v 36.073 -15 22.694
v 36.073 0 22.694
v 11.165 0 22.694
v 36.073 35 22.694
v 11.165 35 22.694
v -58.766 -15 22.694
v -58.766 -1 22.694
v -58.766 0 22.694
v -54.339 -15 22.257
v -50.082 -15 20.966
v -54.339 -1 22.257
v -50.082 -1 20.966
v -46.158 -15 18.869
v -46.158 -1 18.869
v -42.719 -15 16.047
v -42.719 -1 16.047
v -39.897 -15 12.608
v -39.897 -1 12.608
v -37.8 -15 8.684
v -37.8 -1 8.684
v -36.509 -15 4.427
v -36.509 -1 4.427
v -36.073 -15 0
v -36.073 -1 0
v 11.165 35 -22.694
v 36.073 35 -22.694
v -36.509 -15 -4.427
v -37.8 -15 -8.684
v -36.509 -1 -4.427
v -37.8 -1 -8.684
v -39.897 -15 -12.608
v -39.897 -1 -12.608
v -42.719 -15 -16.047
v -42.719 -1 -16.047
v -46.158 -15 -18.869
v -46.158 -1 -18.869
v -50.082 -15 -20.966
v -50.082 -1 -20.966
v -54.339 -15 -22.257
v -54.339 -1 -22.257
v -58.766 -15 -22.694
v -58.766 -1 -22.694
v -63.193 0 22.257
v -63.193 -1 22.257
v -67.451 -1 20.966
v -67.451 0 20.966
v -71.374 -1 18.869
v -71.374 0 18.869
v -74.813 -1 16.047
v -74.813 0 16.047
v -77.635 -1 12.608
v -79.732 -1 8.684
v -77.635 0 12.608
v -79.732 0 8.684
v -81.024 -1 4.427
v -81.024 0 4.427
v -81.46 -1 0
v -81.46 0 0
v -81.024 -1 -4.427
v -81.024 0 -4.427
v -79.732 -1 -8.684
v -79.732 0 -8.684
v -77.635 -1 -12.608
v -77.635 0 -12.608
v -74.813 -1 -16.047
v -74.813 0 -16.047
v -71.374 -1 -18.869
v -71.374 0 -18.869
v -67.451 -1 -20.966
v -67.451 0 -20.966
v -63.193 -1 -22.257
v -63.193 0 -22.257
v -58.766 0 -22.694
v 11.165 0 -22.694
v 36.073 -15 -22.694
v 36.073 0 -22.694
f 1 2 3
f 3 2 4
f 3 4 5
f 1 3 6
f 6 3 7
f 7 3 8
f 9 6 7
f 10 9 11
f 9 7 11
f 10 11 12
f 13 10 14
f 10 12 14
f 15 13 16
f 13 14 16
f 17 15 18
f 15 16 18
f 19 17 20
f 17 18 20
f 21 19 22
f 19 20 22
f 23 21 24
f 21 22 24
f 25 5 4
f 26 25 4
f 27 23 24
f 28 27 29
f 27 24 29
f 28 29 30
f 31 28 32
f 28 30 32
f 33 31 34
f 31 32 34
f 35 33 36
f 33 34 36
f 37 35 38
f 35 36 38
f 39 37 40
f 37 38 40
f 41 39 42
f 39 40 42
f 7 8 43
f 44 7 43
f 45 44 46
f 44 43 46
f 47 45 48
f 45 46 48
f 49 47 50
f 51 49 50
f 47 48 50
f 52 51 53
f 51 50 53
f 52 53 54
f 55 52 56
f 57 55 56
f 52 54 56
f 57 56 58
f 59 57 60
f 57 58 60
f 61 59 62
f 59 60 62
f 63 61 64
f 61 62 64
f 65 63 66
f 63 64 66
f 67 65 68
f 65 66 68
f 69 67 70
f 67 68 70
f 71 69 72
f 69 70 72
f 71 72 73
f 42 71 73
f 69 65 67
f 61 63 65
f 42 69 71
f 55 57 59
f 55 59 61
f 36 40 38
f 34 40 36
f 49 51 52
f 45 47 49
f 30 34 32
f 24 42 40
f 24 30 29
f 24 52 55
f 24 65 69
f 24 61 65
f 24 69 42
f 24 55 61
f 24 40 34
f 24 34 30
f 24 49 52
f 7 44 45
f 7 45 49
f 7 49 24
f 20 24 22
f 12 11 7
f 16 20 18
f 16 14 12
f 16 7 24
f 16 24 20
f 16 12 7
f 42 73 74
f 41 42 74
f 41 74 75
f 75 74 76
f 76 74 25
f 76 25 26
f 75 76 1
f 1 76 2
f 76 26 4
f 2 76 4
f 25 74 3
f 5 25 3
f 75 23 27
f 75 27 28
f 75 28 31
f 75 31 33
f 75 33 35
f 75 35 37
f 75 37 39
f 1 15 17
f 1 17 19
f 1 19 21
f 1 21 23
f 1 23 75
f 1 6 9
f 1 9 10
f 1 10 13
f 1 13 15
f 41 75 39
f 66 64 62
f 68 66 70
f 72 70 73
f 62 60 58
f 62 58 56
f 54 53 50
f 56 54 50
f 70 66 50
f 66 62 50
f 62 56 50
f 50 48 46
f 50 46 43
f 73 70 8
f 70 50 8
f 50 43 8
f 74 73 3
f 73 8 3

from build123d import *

# Parameters (mm, degrees)
F2_DEPTH = 15
F3_W     = 24.9072536826
F3_H     = 45.3870967031
F4_DEPTH = 50
F5_DEPTH = 1


# Not quite as in the source:
# - the program builds the solid bodies; features that only make, move or delete a surface that nothing else refers to are left out


with BuildPart() as f2:
    # F0 (on Front) → F2 (new body)
    with BuildSketch(Plane.XZ):
        with BuildLine():
            ThreePointArc((-58.766130358, 22.6935483515), (-42.7193684294, 16.0467619285), (-36.0725820065, 0))
            ThreePointArc((-36.0725820065, 0), (-42.7193684294, -16.0467619285), (-58.766130358, -22.6935483515))
            Line((-58.766130358, -22.6935483515), (36.0725782812, -22.6935483515))
            Line((36.0725782812, -22.6935483515), (36.0725782812, 22.6935483515))
            Line((36.0725782812, 22.6935483515), (-58.766130358, 22.6935483515))
        make_face()
    extrude(amount=F2_DEPTH)

    # F3 (on face) → F4 (join)
    with BuildSketch(Plane.XZ.offset(15)):
        with Locations((23.6189514399, 0)):
            Rectangle(F3_W, F3_H)
    extrude(amount=-F4_DEPTH)

    # F0 (on Front) → F5 (join)
    with BuildSketch(Plane.XZ):
        with BuildLine():
            ThreePointArc((-58.766130358, -22.6935483515), (-42.7193684294, -16.0467619285), (-36.0725820065, 0))
            ThreePointArc((-36.0725820065, 0), (-42.7193684294, 16.0467619285), (-58.766130358, 22.6935483515))
            Line((-58.766130358, 22.6935483515), (-58.766130358, -22.6935483515))
        make_face()
        with BuildLine():
            Line((-58.766130358, -22.6935483515), (-58.766130358, 22.6935483515))
            ThreePointArc((-58.766130358, 22.6935483515), (-81.4596787095, 0), (-58.766130358, -22.6935483515))
        make_face()
    extrude(amount=F5_DEPTH)


solid = f2.part
